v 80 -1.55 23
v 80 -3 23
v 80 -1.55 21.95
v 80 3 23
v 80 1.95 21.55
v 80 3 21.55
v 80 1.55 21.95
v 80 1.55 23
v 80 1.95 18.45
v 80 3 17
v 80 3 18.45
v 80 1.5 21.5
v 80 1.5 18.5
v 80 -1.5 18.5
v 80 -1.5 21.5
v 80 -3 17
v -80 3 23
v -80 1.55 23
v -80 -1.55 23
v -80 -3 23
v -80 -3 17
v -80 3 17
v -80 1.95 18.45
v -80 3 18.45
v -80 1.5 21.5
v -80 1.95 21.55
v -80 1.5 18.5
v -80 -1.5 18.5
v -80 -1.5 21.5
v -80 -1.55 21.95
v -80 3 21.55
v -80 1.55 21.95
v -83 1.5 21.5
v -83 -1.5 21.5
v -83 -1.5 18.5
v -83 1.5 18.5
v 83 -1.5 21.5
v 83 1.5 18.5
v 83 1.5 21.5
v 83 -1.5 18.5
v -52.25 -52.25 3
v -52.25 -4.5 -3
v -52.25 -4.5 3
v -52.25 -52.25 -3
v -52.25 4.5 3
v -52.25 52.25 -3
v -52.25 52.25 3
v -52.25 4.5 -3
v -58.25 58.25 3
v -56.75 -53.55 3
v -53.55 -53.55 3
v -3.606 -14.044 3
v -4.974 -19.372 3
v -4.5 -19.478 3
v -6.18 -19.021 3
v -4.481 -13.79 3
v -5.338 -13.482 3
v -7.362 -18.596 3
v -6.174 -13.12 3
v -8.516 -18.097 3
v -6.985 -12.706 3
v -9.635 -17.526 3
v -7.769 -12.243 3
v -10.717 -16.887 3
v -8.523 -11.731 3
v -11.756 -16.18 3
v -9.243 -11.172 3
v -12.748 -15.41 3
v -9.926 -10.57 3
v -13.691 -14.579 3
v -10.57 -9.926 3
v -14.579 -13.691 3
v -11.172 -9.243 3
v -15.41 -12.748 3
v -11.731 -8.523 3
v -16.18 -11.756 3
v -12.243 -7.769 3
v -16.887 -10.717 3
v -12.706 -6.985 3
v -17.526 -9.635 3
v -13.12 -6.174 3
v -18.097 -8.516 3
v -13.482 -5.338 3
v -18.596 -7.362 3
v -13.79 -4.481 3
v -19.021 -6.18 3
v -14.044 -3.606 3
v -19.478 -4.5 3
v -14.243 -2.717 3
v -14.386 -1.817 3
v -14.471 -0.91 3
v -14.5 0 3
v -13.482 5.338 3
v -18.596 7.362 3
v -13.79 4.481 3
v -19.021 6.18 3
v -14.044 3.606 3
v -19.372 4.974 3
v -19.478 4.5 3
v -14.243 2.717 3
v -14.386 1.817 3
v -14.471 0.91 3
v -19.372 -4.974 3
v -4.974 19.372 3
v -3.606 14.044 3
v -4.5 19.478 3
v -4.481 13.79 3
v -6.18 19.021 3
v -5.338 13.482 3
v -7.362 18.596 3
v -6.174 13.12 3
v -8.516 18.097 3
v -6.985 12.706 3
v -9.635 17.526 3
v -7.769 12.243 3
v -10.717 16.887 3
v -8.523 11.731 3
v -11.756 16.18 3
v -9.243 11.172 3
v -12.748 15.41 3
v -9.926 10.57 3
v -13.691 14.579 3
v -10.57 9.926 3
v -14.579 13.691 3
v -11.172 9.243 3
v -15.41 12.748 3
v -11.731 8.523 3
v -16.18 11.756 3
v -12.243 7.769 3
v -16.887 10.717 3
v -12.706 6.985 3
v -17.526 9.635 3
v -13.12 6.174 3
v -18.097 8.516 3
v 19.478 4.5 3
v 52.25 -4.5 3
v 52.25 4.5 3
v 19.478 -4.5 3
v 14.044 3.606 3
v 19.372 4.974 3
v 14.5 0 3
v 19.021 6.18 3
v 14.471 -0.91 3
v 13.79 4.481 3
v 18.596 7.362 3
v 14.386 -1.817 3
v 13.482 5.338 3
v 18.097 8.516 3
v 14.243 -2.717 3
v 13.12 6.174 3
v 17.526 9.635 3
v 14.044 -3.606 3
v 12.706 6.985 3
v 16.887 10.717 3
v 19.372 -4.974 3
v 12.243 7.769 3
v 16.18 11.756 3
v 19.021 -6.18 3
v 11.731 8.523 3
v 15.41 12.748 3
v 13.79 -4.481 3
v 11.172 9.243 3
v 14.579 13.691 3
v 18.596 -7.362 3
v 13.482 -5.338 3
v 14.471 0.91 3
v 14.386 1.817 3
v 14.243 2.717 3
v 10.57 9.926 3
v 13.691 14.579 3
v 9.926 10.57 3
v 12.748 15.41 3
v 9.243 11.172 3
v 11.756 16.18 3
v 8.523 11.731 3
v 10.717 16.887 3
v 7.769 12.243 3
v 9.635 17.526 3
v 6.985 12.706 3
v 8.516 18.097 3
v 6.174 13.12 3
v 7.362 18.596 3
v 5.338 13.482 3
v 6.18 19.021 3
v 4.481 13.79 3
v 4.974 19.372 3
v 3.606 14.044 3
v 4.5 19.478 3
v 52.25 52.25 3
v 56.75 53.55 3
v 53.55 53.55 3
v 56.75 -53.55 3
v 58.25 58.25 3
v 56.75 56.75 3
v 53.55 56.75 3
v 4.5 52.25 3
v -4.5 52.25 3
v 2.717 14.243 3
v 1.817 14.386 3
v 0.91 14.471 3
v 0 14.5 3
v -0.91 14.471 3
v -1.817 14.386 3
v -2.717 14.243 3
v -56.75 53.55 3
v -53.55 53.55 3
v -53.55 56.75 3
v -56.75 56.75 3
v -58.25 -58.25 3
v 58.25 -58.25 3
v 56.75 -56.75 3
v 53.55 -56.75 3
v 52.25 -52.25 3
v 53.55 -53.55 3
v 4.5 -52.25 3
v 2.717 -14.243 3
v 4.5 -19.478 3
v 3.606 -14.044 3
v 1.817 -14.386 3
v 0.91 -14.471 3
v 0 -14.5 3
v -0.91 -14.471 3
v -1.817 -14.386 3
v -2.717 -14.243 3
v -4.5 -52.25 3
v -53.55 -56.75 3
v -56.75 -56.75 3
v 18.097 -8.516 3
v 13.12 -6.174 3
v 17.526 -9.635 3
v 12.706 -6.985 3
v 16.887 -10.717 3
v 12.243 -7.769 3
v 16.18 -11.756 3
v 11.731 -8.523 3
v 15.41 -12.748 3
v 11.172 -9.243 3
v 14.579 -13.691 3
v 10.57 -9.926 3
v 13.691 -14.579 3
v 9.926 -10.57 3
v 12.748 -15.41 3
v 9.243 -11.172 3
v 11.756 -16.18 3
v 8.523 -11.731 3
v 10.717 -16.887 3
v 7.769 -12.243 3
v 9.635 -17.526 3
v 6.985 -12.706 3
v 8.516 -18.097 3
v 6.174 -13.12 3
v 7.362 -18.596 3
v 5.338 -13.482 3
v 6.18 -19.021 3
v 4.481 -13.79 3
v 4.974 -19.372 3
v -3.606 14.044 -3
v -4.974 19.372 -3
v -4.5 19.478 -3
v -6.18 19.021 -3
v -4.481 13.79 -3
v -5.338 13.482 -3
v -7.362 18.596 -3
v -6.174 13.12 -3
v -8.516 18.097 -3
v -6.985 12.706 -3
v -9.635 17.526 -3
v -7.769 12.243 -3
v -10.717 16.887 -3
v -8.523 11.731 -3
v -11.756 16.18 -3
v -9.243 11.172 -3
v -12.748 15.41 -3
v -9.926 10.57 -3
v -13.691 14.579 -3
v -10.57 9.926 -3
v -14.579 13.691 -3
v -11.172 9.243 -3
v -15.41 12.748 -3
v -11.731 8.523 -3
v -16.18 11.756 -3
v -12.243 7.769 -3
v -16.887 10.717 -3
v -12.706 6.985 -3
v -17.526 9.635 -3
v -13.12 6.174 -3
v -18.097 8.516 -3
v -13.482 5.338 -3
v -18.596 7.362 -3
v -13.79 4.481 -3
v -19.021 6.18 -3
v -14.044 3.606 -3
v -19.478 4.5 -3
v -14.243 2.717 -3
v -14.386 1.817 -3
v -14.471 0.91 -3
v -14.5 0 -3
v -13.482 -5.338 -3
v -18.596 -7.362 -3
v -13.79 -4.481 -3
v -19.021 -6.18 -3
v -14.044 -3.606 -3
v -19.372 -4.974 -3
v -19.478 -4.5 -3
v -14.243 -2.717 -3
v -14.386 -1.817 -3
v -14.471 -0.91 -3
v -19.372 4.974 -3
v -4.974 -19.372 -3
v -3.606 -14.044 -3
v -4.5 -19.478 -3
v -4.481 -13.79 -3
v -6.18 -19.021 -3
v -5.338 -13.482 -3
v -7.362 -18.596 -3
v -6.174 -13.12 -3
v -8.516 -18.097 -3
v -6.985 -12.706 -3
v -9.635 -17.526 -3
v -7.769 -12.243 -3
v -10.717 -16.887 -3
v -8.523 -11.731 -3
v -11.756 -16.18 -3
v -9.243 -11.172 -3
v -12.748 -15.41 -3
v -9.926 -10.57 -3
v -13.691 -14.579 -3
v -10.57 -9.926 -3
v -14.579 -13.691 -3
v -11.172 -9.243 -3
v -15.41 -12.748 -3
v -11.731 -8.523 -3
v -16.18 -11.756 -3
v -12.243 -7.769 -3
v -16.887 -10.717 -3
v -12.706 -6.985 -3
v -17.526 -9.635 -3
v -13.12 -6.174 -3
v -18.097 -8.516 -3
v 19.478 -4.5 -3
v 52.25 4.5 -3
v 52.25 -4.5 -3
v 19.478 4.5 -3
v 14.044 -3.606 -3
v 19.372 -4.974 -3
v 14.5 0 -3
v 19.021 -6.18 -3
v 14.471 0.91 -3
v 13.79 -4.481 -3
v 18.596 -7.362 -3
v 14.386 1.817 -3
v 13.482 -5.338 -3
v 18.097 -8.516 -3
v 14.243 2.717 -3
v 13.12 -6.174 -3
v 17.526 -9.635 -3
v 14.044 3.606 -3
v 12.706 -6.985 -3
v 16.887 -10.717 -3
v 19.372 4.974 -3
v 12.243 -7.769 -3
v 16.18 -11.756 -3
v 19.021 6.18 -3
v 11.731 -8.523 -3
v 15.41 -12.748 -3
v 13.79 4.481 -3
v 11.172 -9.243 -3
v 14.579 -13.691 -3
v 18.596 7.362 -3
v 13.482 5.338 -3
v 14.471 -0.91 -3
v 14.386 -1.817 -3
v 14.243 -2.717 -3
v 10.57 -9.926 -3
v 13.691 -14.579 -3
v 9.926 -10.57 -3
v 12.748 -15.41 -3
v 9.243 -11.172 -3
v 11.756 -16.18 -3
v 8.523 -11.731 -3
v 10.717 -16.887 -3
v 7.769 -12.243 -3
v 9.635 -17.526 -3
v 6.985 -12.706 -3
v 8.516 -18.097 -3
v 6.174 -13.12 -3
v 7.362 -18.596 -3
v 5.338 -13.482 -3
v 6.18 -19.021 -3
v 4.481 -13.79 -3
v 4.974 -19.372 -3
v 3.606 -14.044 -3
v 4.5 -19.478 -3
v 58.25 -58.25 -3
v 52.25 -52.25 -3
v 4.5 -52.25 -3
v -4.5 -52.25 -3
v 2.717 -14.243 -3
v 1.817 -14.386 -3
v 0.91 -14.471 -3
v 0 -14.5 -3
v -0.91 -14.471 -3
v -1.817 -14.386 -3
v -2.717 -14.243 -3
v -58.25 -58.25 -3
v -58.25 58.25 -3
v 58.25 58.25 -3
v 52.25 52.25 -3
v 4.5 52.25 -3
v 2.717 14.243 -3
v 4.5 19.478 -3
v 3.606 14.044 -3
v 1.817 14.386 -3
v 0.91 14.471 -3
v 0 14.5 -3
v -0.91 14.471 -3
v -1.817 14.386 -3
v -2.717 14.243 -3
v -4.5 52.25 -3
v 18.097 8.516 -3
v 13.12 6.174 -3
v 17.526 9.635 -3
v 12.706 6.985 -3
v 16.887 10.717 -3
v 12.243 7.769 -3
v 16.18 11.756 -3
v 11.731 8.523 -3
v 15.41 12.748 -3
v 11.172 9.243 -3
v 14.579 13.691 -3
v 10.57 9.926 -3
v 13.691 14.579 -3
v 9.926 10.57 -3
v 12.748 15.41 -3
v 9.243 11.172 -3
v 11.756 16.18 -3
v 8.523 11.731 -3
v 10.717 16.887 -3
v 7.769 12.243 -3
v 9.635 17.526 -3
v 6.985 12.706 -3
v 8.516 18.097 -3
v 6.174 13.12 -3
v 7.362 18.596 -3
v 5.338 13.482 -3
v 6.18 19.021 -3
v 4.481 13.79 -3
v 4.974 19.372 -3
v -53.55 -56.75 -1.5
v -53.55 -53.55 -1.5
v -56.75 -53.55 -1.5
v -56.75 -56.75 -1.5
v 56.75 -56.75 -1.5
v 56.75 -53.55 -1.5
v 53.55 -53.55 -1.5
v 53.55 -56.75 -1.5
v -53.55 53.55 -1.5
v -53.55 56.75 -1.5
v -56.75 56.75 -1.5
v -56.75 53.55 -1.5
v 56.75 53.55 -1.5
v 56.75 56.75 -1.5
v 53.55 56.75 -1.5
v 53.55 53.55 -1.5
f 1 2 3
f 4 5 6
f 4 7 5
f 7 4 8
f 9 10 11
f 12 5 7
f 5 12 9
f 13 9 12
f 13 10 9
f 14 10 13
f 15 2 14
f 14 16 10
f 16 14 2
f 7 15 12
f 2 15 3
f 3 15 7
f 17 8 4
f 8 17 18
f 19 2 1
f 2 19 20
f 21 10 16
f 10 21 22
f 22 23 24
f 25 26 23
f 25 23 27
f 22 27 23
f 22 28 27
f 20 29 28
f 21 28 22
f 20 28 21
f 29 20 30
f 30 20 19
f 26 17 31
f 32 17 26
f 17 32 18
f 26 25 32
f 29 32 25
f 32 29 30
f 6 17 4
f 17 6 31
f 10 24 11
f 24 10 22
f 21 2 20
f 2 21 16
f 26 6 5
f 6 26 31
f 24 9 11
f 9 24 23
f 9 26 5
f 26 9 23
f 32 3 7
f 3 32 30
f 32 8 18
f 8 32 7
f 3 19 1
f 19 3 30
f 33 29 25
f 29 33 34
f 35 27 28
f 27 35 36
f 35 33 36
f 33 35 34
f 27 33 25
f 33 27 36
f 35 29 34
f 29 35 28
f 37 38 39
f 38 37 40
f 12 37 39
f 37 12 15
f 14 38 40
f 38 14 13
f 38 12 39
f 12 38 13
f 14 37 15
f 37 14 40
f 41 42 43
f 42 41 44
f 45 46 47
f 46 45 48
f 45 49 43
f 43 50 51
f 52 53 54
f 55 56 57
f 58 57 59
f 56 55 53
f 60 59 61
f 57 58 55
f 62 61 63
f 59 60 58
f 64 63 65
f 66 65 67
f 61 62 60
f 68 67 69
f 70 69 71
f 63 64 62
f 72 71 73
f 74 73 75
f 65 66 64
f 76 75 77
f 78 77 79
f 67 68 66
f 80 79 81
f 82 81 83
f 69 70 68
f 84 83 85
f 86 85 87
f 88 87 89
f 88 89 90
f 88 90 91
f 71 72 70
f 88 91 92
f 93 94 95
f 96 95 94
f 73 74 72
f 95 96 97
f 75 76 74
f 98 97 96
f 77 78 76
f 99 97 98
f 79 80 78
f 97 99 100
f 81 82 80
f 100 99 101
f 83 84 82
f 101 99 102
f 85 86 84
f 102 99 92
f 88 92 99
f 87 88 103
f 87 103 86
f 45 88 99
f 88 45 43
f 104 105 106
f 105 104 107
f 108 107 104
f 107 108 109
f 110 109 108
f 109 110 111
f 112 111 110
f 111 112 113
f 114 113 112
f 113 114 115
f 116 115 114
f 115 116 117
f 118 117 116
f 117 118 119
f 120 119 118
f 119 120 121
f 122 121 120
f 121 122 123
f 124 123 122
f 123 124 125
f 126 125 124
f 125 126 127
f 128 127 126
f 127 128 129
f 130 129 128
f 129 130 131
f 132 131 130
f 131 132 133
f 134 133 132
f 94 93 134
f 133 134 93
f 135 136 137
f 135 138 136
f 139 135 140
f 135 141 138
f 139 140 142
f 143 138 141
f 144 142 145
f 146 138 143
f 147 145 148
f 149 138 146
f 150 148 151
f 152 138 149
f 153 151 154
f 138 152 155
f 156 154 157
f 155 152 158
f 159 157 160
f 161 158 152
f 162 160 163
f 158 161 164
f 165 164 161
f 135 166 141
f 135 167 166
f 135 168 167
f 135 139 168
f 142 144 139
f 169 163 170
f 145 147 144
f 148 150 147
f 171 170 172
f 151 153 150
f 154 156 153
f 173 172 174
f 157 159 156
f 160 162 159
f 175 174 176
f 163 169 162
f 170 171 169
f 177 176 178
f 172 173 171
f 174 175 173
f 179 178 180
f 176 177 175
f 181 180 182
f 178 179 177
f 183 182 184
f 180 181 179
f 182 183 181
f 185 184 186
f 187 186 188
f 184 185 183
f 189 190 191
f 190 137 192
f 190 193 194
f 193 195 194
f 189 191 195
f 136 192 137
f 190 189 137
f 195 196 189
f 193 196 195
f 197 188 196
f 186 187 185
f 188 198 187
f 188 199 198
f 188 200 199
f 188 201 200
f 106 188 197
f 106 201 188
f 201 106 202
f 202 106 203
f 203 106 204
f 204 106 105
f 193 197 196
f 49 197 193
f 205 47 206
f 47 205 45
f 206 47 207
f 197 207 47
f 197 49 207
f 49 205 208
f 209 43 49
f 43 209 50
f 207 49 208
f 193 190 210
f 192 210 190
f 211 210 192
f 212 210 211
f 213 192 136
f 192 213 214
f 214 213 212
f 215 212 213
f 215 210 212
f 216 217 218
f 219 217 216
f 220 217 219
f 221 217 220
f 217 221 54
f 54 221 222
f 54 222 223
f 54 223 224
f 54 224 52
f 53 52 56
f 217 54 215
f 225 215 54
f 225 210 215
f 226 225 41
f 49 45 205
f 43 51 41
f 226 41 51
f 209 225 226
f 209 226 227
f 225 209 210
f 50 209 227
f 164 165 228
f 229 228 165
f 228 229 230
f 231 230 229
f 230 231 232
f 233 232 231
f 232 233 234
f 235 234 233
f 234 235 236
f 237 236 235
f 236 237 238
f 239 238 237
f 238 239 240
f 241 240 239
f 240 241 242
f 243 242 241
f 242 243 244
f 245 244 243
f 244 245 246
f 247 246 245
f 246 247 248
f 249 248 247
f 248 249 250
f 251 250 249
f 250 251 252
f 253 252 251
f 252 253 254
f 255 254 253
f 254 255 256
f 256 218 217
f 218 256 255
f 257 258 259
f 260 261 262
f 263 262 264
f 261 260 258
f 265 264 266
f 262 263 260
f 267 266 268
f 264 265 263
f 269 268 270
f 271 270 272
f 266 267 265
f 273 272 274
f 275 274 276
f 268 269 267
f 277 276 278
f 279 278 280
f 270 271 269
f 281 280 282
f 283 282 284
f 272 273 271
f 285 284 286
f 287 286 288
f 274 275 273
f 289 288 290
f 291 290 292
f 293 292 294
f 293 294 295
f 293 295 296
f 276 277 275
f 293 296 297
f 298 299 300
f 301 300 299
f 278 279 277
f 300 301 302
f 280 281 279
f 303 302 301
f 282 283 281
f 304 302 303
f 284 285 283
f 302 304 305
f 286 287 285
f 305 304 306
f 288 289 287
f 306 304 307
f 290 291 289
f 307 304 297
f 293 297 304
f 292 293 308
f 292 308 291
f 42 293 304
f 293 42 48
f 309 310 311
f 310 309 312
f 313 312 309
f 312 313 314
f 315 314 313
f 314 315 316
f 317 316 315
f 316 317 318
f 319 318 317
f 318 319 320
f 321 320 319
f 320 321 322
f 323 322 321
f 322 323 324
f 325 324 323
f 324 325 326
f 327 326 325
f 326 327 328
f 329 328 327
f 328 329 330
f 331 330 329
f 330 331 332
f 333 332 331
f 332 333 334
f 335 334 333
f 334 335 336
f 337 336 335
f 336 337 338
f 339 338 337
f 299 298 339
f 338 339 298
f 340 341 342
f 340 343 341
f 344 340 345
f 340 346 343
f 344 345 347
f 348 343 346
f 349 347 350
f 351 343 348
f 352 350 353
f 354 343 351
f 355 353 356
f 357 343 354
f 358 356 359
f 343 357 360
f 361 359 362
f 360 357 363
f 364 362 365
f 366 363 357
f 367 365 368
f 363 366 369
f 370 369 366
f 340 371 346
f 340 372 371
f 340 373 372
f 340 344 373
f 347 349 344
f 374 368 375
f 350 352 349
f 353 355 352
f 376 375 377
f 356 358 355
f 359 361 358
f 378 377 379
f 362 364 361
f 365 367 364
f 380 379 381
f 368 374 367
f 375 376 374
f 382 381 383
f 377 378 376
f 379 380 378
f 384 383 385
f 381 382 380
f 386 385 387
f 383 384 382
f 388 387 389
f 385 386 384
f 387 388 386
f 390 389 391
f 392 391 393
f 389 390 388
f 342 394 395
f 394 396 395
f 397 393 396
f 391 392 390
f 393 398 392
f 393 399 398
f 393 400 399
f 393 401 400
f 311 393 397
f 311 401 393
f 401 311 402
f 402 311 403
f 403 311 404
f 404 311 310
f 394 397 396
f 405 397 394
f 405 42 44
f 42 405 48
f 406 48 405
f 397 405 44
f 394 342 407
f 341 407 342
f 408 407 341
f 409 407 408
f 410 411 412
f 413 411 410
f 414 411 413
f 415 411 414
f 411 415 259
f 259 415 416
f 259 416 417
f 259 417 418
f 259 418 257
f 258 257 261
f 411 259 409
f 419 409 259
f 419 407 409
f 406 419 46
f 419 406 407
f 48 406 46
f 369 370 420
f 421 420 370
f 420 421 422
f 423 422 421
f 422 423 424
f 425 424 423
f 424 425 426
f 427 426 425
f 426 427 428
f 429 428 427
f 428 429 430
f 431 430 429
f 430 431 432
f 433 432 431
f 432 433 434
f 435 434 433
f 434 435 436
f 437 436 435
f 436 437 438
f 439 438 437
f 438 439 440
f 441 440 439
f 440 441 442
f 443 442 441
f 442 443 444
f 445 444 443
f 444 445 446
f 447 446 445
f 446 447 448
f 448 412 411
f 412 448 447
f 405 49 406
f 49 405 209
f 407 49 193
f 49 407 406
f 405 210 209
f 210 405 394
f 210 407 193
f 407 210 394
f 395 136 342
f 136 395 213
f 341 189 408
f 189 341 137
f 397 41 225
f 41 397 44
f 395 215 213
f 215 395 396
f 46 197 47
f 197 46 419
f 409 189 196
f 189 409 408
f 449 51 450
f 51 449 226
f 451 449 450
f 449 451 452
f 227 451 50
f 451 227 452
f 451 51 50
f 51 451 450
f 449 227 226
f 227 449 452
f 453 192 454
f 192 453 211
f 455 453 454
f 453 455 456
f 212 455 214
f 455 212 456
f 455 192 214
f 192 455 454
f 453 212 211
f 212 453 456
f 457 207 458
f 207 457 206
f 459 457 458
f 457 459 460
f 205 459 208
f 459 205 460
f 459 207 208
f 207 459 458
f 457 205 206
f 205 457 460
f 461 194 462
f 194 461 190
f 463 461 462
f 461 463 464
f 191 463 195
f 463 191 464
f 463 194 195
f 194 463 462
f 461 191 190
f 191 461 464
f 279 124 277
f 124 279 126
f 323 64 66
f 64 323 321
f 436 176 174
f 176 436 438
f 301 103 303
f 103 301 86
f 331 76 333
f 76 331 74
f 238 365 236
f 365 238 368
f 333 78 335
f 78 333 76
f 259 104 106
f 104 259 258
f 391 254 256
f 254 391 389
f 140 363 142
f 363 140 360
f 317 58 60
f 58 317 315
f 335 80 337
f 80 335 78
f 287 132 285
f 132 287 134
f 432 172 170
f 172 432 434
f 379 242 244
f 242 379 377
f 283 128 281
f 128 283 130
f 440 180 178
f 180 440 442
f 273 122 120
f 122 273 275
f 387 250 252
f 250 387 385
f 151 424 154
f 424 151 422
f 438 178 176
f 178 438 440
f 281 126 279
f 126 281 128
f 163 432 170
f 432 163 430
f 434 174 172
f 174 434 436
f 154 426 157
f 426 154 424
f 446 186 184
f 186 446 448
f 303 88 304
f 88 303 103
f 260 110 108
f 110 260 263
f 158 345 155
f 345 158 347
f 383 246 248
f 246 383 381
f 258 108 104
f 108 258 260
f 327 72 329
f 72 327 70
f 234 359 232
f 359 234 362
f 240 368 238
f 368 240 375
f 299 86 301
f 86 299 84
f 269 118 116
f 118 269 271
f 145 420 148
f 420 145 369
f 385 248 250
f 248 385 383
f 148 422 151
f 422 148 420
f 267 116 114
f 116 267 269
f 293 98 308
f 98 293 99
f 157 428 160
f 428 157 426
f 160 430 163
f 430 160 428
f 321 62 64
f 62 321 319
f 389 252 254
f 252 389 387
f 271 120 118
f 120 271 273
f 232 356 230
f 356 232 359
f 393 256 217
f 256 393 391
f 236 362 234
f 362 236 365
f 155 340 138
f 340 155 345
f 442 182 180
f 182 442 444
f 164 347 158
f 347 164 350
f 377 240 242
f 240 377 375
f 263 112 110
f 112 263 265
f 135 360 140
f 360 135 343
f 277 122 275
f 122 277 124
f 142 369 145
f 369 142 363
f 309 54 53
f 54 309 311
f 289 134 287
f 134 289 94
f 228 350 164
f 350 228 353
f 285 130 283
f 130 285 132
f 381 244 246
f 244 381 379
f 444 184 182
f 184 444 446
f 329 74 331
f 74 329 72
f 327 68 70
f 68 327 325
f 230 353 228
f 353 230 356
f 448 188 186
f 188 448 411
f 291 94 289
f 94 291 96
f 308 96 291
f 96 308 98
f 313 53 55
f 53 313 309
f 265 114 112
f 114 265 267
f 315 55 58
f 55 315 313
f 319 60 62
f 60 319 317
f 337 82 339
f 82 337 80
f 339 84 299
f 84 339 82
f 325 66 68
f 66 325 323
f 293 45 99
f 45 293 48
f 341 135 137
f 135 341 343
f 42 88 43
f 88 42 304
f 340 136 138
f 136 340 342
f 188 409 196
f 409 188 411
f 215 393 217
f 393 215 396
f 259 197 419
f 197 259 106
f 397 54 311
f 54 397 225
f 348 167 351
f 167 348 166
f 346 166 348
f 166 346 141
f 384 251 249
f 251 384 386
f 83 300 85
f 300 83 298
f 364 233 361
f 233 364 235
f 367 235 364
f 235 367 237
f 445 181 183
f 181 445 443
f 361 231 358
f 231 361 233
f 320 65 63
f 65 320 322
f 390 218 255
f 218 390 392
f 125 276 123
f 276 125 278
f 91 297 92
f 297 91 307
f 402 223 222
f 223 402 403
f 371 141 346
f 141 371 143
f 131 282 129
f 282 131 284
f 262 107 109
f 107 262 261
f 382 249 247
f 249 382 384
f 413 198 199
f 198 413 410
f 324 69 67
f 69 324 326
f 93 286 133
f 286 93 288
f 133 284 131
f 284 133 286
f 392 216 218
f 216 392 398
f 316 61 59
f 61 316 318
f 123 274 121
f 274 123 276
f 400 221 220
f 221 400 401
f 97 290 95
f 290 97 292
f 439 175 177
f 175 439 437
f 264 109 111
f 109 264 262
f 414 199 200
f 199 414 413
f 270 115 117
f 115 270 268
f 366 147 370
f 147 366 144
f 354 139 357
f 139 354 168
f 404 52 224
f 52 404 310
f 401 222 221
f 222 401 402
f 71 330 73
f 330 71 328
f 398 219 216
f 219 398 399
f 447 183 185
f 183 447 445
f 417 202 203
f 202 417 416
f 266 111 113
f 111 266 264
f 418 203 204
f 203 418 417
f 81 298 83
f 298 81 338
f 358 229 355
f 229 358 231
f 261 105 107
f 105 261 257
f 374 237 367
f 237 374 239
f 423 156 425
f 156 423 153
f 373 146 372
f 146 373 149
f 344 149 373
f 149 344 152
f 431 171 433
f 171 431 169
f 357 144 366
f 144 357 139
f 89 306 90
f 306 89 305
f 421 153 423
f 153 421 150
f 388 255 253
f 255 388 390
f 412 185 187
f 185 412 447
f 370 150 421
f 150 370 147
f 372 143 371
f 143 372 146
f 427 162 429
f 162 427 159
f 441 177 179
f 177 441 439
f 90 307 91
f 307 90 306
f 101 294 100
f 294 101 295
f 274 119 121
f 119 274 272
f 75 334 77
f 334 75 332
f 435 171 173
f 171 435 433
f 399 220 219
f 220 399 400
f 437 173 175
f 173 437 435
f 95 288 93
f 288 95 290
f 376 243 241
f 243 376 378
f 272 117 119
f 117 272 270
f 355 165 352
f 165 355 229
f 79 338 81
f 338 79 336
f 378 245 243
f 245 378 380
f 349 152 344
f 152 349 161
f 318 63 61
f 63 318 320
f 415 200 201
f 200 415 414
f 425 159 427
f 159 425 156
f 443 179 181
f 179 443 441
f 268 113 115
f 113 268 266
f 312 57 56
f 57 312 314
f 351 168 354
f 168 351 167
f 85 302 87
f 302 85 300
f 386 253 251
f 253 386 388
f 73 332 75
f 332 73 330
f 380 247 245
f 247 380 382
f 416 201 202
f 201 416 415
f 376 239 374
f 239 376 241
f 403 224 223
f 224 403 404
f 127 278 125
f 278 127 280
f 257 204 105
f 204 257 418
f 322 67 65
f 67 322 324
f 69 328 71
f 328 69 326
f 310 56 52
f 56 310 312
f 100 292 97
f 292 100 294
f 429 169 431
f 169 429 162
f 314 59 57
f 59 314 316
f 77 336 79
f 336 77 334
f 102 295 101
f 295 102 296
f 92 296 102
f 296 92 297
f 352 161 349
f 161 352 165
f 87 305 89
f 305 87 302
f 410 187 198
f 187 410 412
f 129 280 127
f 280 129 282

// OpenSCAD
/* [Image] */
// Height
h=160;
// Width
w=106.5;
// Thickness
t=3;

/* [Hidden] */
e14 = 14;
e14_outer = 20;

translate([0,0,20]) corner();
outer();
inner();

module inner() {
    difference() {
        union() {
            cylinder(h=2*t, r=e14_outer, $fn=100, center=true);
            cube([w, 3*t, 2*t], center=true);
            cube([3*t, w, 2*t], center=true);
        }
        cylinder(h=100, r=e14+0.5, $fn=100, center=true);
    }
};

module outer() {
    difference() {
        union() {
            translate([-(w/2 + t-1), 0, 0]) cube([2*t,w+4*t-2,2*t], center=true);
            translate([+(w/2 + t-1), 0, 0]) cube([2*t,w+4*t-2,2*t], center=true);
            translate([0, -(w/2 + t-1), 0]) cube([w-2,2*t,2*t], center=true);
            translate([0, +(w/2 + t-1), 0]) cube([w-2,2*t,2*t], center=true);
        }
        translate([-(w/2 + t-1.1), -(w/2 + t-1.1), 10])  cube([t+0.2, t+0.2, t+20], center=true);
        translate([+(w/2 + t-1.1), -(w/2 + t-1.1), 10])  cube([t+0.2, t+0.2, t+20], center=true);
        translate([-(w/2 + t-1.1), +(w/2 + t-1.1), 10])  cube([t+0.2, t+0.2, t+20], center=true);
        translate([+(w/2 + t-1.1), +(w/2 + t-1.1), 10])  cube([t+0.2, t+0.2, t+20], center=true);
    }
}

module corner() {
    difference() {
        cube([h, 2*t, 2*t], center=true);
        translate([0, t+0.5, 0]) cube([2*h, t+0.1, t+0.1], center=true);
        translate([0, 0, t+0.5]) cube([2*h, t+0.1, t+0.1], center=true);
    }
    translate([-h/2-t/2,0,0]) cube([t,t,t], center=true);
    translate([+h/2+t/2,0,0]) cube([t,t,t], center=true);
}
